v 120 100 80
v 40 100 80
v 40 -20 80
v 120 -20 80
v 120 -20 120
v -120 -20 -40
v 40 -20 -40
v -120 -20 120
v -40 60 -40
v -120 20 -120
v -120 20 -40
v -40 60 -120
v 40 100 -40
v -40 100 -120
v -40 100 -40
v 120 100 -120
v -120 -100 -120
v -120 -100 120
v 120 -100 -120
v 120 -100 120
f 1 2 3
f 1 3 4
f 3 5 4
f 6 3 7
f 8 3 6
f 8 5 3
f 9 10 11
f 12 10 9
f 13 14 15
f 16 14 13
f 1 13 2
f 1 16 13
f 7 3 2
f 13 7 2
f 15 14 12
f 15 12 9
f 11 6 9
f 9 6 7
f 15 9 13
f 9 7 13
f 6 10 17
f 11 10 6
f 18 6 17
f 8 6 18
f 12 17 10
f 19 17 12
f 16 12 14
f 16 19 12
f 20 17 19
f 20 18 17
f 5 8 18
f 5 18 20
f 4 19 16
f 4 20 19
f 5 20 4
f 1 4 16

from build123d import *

# Parameters (mm, degrees)
BOSS_EXTRUDE1_DEPTH      = 120
SKETCH1_3_W              = 80
SKETCH1_3_H              = 120
BOSS_EXTRUDE2_DEPTH      = 80
BOSS_EXTRUDE3_DEPTH      = 120
SKETCH1_5_W              = 80
SKETCH1_5_H              = 120
BOSS_EXTRUDE4_DEPTH      = 120
SKETCH2_W                = 80
SKETCH2_H                = 40
BOSS_EXTRUDE5_DEPTH      = 160
SKETCH2_8_W              = 80
SKETCH2_8_H              = 40
BOSS_EXTRUDE6_DEPTH      = 80
SKETCH2_9_W              = 80
SKETCH2_9_H              = 40
BOSS_EXTRUDE7_DEPTH      = 160
CUT_EXTRUDE20_DEPTH      = 224.60679775
CUT_EXTRUDE20_DEPTH_BACK = 121


with BuildPart() as part:
    # Sketch1 → Boss-Extrude1 (new body)
    with BuildSketch(Plane.XY):
        Polygon((120, -100), (120, -20), (40, -20), (-120, -20), (-120, -100), align=None)
    extrude(amount=BOSS_EXTRUDE1_DEPTH)

    # Sketch1<3> → Boss-Extrude2 (add)
    with BuildSketch(Plane.XY):
        with Locations((80, 40)):
            Rectangle(SKETCH1_3_W, SKETCH1_3_H)
    extrude(amount=BOSS_EXTRUDE2_DEPTH)

    # Sketch1<4> → Boss-Extrude3 (add)
    with BuildSketch(Plane.XY):
        Polygon((120, -100), (120, -20), (40, -20), (-120, -20), (-120, -100), align=None)
    extrude(amount=-BOSS_EXTRUDE3_DEPTH)

    # Sketch1<5> → Boss-Extrude4 (add)
    with BuildSketch(Plane.XY):
        with Locations((80, 40)):
            Rectangle(SKETCH1_5_W, SKETCH1_5_H)
    extrude(amount=-BOSS_EXTRUDE4_DEPTH)

    # Sketch2 → Boss-Extrude5 (add)
    with BuildSketch(Plane.ZY.offset(-40)):
        with Locations((-80, 0)):
            Rectangle(SKETCH2_W, SKETCH2_H)
    extrude(amount=BOSS_EXTRUDE5_DEPTH)

    # Sketch2<8> → Boss-Extrude6 (add)
    with BuildSketch(Plane.ZY.offset(-40)):
        with Locations((-80, 80)):
            Rectangle(SKETCH2_8_W, SKETCH2_8_H)
    extrude(amount=BOSS_EXTRUDE6_DEPTH)

    # Sketch2<9> → Boss-Extrude7 (add)
    with BuildSketch(Plane.ZY.offset(-40)):
        with Locations((-80, 40)):
            Rectangle(SKETCH2_9_W, SKETCH2_9_H)
    extrude(amount=BOSS_EXTRUDE7_DEPTH)

    # Sketch4 → Cut-Extrude20 (cut, two sides: drawn at the far end of the back side and taken through both)
    with BuildSketch(Plane.XY.offset(-40).offset(-CUT_EXTRUDE20_DEPTH_BACK)):
        Polygon((-120, 20), (-40, 60), (-120, 60), align=None)
    extrude(amount=CUT_EXTRUDE20_DEPTH + CUT_EXTRUDE20_DEPTH_BACK, mode=Mode.SUBTRACT)


solid = part.part
